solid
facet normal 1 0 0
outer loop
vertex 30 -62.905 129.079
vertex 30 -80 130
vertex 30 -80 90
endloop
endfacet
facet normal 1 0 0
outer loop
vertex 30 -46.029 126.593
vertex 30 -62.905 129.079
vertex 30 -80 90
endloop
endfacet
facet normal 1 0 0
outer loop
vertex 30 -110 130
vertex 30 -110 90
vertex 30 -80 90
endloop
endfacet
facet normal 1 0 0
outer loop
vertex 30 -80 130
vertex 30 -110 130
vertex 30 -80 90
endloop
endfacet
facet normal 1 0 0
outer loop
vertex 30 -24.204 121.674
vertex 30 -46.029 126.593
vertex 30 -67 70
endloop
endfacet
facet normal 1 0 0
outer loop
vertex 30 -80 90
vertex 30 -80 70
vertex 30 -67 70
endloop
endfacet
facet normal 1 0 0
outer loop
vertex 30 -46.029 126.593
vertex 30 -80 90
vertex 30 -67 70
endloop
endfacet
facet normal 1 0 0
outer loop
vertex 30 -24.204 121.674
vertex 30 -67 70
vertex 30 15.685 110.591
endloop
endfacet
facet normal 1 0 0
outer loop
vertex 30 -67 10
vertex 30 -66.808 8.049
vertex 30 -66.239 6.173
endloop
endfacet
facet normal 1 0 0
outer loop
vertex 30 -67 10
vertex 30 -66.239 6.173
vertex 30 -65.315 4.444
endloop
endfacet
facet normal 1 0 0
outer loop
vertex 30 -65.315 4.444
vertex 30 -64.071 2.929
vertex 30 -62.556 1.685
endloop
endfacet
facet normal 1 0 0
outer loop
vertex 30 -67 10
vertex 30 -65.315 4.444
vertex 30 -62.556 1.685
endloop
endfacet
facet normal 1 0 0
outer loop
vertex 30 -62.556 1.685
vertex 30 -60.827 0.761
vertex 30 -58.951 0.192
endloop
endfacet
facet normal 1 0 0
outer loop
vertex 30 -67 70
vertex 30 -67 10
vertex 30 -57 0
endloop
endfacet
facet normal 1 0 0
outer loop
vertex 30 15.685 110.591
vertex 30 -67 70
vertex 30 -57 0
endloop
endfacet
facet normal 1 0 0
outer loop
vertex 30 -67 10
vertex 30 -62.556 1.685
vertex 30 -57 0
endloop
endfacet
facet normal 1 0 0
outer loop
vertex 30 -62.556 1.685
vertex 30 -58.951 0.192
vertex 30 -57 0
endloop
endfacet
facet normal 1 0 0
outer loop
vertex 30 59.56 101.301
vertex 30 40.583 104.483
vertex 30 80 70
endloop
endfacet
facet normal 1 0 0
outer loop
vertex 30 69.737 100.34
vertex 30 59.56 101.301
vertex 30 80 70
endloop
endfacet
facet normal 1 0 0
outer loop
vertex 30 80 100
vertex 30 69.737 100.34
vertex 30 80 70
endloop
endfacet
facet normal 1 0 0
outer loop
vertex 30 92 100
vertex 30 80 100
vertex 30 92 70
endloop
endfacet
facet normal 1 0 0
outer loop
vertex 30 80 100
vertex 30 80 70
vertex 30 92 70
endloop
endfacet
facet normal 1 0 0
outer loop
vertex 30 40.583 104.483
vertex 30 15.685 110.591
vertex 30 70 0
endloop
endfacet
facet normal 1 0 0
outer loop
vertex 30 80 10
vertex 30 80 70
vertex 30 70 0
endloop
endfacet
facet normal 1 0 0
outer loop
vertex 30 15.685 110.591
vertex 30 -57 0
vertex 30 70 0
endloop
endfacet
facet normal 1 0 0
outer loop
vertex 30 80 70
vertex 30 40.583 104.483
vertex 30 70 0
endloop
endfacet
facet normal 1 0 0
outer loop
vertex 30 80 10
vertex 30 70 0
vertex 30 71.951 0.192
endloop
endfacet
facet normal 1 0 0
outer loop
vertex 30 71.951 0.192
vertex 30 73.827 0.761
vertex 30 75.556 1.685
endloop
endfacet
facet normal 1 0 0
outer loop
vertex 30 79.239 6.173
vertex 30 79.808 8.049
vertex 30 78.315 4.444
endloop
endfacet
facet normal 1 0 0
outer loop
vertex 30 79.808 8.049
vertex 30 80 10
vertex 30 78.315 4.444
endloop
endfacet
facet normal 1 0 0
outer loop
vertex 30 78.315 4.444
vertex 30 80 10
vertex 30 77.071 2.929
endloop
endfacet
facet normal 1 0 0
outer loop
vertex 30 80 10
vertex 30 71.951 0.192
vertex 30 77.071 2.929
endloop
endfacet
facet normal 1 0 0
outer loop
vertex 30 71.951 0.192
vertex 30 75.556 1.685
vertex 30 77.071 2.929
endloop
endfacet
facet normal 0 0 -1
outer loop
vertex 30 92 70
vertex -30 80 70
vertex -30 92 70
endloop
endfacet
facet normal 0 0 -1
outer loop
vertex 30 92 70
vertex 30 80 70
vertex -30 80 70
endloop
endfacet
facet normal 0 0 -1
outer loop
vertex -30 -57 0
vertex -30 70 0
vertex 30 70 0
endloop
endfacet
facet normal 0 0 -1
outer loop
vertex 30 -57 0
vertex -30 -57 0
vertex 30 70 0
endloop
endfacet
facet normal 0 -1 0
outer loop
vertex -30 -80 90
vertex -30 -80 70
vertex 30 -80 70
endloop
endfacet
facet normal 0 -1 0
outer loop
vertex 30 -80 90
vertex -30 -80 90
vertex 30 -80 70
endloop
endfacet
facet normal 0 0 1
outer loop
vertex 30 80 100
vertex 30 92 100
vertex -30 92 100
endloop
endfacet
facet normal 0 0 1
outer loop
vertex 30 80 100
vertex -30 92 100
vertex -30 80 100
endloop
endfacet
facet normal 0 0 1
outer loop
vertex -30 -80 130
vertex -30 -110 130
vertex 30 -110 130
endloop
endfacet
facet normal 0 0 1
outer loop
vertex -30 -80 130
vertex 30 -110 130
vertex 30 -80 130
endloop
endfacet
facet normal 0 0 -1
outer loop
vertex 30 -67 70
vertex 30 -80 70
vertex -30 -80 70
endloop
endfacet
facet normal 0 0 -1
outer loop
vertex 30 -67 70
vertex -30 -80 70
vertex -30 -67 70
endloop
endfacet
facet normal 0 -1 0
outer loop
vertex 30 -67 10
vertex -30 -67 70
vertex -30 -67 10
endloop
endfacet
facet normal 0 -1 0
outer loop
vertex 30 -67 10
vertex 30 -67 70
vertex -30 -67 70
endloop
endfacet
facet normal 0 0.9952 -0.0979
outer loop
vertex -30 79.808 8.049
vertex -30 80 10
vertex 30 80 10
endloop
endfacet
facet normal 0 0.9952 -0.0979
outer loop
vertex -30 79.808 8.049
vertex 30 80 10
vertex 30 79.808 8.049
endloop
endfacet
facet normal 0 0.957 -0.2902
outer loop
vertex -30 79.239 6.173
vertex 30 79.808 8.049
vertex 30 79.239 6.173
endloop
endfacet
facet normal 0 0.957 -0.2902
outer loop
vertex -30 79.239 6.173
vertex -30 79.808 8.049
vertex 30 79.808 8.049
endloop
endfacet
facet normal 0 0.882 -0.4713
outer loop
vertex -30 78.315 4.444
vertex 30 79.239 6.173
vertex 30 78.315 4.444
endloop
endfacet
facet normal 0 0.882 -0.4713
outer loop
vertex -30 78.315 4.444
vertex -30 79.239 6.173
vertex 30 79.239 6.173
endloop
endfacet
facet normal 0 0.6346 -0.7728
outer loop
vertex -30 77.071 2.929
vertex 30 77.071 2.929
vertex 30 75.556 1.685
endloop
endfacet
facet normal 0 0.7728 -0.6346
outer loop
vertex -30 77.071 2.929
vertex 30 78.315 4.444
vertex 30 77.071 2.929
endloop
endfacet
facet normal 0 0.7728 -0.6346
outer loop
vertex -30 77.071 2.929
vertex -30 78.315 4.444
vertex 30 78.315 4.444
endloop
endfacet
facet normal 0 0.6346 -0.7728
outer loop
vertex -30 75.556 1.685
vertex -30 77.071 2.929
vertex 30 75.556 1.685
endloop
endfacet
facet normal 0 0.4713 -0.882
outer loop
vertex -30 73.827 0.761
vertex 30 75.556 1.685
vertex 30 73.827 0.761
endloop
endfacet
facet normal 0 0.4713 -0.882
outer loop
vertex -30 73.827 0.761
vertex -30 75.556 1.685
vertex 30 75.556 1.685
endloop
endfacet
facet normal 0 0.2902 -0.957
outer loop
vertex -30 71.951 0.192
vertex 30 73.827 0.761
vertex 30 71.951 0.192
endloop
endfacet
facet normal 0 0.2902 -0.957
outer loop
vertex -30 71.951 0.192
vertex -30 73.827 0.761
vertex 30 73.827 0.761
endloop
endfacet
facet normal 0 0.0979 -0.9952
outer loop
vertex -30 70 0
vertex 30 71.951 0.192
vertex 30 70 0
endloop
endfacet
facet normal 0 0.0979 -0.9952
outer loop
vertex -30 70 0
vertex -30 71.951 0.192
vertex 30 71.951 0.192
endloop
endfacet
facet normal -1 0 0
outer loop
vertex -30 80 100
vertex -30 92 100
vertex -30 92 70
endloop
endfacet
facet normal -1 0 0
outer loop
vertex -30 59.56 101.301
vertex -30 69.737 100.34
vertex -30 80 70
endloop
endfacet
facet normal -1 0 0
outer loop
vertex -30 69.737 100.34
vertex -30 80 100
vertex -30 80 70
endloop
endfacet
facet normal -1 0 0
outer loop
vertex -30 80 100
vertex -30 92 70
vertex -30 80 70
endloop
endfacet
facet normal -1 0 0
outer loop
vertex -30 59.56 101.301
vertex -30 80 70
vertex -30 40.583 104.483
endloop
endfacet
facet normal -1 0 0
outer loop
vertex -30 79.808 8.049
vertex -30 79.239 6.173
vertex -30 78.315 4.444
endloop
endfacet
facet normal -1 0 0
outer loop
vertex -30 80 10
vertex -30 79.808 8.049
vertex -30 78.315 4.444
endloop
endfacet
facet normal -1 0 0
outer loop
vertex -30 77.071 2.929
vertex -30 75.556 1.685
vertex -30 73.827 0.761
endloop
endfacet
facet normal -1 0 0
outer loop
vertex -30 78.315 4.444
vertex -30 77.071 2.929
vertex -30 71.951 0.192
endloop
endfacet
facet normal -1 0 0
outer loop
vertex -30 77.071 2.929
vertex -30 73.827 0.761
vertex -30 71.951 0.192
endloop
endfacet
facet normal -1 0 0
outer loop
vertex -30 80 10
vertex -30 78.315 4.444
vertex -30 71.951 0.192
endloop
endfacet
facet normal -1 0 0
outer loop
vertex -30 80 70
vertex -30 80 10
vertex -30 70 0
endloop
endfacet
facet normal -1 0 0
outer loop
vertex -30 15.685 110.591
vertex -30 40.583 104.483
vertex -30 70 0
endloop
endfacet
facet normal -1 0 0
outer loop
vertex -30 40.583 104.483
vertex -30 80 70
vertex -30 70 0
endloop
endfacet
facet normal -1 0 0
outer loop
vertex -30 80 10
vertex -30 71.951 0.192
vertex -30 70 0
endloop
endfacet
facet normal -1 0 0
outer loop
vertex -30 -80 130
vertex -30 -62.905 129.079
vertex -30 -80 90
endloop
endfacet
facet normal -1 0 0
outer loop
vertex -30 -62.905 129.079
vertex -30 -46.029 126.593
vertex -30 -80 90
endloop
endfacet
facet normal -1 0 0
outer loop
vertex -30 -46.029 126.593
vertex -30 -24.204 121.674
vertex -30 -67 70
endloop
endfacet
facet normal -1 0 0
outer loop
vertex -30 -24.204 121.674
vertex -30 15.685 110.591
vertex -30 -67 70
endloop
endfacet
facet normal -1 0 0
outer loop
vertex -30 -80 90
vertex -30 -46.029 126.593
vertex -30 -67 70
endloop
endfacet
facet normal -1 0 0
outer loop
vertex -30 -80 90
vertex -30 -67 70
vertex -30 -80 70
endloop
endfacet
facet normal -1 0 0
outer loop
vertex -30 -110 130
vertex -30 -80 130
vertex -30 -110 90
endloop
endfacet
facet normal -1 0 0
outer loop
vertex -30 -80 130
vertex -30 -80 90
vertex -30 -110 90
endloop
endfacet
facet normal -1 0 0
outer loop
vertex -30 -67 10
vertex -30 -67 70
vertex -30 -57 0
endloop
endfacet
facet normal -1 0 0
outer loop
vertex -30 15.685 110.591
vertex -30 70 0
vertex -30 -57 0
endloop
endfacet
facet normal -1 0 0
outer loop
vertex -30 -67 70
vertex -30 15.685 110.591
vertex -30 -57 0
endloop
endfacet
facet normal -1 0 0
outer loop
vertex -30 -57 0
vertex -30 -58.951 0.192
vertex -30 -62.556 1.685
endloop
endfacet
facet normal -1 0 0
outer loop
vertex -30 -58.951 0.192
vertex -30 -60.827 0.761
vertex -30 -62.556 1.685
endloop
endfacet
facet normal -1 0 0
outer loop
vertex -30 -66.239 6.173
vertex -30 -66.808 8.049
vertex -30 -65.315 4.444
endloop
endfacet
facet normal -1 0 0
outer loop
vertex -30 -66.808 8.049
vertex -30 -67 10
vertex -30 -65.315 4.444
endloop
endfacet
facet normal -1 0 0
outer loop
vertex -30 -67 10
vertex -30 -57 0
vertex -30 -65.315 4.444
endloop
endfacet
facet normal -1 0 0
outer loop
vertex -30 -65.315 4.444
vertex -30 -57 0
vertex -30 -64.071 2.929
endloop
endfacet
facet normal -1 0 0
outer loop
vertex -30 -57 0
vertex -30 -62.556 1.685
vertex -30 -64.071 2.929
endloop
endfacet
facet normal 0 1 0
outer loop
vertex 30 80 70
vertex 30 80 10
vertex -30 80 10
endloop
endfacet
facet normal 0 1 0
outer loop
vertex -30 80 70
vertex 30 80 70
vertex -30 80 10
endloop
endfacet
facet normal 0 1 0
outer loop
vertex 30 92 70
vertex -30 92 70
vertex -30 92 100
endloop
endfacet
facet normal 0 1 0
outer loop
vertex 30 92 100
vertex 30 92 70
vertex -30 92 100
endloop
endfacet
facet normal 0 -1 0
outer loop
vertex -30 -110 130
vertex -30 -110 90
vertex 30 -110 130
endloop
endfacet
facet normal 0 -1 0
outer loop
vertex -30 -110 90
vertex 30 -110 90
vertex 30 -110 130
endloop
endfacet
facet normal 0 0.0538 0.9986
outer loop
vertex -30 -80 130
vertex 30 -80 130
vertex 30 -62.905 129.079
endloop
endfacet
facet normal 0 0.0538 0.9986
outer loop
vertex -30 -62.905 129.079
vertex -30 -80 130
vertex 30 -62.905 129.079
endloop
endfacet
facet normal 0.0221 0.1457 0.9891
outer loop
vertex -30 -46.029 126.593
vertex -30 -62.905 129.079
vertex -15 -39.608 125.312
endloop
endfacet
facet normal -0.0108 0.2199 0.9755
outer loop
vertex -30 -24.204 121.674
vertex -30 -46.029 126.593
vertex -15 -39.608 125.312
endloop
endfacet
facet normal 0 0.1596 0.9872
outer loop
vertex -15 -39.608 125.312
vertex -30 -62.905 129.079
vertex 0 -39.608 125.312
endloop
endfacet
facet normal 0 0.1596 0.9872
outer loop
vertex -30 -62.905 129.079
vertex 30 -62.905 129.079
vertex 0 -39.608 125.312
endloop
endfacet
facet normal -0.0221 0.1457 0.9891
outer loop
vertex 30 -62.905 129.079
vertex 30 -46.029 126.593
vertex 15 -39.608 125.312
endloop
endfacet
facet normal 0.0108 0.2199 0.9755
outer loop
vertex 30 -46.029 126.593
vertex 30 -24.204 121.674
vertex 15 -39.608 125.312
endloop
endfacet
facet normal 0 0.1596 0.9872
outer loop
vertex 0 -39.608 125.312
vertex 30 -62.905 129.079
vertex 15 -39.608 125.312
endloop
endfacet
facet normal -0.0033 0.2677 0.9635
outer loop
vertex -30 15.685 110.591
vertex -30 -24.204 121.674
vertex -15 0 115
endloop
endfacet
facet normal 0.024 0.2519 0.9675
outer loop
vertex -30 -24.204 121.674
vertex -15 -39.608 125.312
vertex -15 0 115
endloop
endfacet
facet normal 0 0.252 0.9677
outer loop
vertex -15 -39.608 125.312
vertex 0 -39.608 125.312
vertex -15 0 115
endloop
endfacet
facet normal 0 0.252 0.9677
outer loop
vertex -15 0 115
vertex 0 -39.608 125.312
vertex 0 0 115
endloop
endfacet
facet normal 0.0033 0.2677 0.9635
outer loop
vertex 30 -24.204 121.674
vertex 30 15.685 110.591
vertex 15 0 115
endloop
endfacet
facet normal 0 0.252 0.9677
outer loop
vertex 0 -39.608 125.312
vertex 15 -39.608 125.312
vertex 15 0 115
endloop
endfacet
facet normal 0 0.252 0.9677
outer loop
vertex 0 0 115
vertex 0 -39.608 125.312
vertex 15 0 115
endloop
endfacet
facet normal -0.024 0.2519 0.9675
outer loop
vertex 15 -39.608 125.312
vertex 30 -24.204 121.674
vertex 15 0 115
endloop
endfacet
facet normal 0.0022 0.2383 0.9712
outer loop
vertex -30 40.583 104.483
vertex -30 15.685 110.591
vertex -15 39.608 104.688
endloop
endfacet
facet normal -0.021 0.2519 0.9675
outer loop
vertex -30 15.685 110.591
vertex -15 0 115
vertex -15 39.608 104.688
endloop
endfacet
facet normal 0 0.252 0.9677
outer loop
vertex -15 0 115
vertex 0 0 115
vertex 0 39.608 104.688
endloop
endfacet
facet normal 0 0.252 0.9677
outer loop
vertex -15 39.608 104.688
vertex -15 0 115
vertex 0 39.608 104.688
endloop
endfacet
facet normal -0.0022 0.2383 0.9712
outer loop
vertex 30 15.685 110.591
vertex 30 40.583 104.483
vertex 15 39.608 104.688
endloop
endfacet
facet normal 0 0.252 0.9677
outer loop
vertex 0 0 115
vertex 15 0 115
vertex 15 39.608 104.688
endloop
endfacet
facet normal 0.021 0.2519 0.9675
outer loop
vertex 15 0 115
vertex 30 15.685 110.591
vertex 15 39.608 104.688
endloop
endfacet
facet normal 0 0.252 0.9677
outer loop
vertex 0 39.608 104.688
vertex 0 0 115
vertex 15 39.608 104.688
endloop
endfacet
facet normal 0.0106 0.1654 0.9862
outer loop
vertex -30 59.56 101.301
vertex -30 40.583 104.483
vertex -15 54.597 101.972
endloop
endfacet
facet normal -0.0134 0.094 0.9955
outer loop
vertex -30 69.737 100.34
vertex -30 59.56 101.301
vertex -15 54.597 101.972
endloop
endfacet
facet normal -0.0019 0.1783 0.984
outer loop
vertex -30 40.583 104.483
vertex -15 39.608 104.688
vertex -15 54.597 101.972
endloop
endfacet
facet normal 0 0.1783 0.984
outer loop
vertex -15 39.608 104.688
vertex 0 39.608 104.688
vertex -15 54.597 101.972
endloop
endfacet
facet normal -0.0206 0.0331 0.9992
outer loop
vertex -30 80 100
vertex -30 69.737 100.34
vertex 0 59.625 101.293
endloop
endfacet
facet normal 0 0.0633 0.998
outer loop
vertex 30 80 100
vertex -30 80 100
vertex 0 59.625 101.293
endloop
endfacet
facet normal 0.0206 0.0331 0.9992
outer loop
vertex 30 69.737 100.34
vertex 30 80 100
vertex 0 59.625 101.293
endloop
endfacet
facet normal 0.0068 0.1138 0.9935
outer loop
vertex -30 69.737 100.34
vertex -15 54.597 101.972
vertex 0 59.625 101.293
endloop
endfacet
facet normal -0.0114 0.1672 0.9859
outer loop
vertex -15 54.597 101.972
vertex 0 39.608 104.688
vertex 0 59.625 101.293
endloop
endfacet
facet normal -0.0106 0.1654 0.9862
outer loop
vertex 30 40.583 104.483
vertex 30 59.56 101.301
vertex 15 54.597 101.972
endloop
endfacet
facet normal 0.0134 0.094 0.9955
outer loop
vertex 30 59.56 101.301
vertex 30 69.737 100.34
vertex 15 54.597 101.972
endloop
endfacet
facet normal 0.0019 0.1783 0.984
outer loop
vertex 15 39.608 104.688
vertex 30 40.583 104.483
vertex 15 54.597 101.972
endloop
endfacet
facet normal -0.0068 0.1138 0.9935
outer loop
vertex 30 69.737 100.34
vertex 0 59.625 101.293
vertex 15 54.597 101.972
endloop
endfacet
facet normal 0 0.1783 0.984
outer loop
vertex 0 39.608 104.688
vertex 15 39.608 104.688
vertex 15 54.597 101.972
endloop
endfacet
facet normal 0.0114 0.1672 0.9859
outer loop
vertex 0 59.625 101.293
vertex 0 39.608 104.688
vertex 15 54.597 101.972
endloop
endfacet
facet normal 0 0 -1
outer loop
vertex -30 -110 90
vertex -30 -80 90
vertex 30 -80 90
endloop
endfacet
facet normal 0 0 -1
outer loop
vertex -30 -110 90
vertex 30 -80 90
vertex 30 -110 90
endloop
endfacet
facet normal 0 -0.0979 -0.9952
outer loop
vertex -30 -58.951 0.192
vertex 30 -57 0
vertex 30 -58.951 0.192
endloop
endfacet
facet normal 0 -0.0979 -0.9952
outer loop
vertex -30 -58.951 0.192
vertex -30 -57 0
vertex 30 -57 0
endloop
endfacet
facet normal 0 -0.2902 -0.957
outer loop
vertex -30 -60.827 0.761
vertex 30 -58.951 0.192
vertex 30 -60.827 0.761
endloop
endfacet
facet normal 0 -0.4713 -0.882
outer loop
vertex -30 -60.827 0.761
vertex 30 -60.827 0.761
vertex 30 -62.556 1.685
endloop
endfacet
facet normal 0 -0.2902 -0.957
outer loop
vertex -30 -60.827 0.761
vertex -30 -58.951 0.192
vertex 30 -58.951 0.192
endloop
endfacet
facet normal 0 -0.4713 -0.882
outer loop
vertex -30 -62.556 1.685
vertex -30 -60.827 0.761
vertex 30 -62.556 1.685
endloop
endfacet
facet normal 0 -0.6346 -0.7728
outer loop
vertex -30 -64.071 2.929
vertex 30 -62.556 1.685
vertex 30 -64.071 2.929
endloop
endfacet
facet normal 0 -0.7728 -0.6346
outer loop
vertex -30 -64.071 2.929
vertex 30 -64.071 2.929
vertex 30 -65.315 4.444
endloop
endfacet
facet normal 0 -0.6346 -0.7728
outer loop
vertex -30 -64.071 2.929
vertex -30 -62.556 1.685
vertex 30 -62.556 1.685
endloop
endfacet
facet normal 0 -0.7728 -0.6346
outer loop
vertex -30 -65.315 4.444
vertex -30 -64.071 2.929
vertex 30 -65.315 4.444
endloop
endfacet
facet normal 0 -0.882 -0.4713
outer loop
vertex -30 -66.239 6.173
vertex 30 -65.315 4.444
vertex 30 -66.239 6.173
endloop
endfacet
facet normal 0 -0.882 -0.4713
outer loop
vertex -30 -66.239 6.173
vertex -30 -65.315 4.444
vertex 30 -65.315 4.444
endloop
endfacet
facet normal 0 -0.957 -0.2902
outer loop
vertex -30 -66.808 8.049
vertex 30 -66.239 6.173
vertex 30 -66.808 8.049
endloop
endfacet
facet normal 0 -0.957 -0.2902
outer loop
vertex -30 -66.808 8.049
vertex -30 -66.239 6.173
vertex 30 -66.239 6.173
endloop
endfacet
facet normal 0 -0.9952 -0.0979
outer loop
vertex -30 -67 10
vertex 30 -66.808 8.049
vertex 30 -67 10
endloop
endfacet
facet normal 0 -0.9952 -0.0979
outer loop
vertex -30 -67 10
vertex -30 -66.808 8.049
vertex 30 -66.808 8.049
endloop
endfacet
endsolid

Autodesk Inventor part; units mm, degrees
ref_plane "YZ Plane" through (0, 0, 0) normal (1, 0, 0) x (0, 1, 0)
ref_plane "XZ Plane" through (0, 0, 0) normal (0, 1, 0) x (-1, 0, 0)
ref_plane "XY Plane" through (0, 0, 0) normal (0, 0, 1) x (1, 0, 0)
sketch "Skizze1" plane through (0, 0, 0) normal (0, 0, 1) x (1, 0, 0)
  line L0 (-30, -80) -> (30, -80)
  line L1 (30, -80) -> (30, 80)
  line L2 (30, 80) -> (-30, 80)
  line L3 (-30, 80) -> (-30, -80)
  line L4 (-30, -80) -> (30, 80) construction
  line L5 (30, -80) -> (-30, 80) construction
  point P0 (0, 0)
  dimension "d0" = 60
  dimension "d1" = 160
extrude "Extrusion1" add sketch "Skizze1" along normal blind 100
sketch "Skizze2" plane through (30, -80, 0) normal (1, 0, 0) x (0, 0, -1)
  line L0 (-100, 160) -> (-100, 0) projected
  line L1 (0, 0) -> (-100, 0) projected
  line L2 (-100, 160) -> (-100, 0)
  line L3 (-100, 0) -> (-130, 0)
  spline S0 degree 4 poles (-130, 0) (-130, 41.0456) (-115, 80) (-100, 118.9544) (-100, 160) knots 0 0 0 0 0 1 1 1 1 1
  point P0 (0, 80)
  point P1 (-115, 80)
  point P2 (-100, 80)
  point P3 (-115, 0)
  dimension "d4" = 30
extrude "Extrusion2" add sketch "Skizze2" against normal up to surface (60 mm away)
sketch "Skizze5" plane through (30, -80, 0) normal (1, 0, 0) x (0, 0, -1)
  line L0 (0, 0) -> (-70, 0)
  line L1 (-70, 0) -> (-70, 13)
  line L2 (-70, 13) -> (0, 13)
  line L3 (0, 13) -> (0, 0)
  point P0 (0, 80)
  dimension "d15" = 70
  dimension "d16" = 13
extrude "Extrusion5" cut sketch "Skizze5" against normal through all
sketch "Skizze6" plane through (30, 80, 100) normal (1, 0, 0) x (0, 0, -1)
  line L0 (30, -160) -> (-30, -160) projected
  line L1 (10, -160) -> (10, -190)
  line L2 (10, -190) -> (-30, -190)
  line L3 (-30, -190) -> (-30, -160)
  line L4 (30, -160) -> (30, -147) projected
  line L5 (100, 0) -> (0, 0) projected
  line L6 (0, 0) -> (30, 0)
  line L7 (30, 0) -> (30, 12)
  line L8 (30, 12) -> (0, 12)
  line L9 (0, 12) -> (0, 0)
  point P0 (100, -80)
  point P1 (30, 0)
  dimension "d19" = 20
  dimension "d20" = 40
  dimension "d21" = 30
  dimension "d24" = 30
  dimension "d25" = 12
extrude "Extrusion6" add sketch "Skizze6" against normal up to surface (60 mm away)
fillet "Rundung1" radius 10 2 edges at (0, -67, 0) (0, 80, 0)
equation "\"G_L\" = 0"
equation "\"G_H\" = 0"
equation "\"G_B\" = 0"
properties part number "canopy" material "GEDA Polyamid schwarz"
